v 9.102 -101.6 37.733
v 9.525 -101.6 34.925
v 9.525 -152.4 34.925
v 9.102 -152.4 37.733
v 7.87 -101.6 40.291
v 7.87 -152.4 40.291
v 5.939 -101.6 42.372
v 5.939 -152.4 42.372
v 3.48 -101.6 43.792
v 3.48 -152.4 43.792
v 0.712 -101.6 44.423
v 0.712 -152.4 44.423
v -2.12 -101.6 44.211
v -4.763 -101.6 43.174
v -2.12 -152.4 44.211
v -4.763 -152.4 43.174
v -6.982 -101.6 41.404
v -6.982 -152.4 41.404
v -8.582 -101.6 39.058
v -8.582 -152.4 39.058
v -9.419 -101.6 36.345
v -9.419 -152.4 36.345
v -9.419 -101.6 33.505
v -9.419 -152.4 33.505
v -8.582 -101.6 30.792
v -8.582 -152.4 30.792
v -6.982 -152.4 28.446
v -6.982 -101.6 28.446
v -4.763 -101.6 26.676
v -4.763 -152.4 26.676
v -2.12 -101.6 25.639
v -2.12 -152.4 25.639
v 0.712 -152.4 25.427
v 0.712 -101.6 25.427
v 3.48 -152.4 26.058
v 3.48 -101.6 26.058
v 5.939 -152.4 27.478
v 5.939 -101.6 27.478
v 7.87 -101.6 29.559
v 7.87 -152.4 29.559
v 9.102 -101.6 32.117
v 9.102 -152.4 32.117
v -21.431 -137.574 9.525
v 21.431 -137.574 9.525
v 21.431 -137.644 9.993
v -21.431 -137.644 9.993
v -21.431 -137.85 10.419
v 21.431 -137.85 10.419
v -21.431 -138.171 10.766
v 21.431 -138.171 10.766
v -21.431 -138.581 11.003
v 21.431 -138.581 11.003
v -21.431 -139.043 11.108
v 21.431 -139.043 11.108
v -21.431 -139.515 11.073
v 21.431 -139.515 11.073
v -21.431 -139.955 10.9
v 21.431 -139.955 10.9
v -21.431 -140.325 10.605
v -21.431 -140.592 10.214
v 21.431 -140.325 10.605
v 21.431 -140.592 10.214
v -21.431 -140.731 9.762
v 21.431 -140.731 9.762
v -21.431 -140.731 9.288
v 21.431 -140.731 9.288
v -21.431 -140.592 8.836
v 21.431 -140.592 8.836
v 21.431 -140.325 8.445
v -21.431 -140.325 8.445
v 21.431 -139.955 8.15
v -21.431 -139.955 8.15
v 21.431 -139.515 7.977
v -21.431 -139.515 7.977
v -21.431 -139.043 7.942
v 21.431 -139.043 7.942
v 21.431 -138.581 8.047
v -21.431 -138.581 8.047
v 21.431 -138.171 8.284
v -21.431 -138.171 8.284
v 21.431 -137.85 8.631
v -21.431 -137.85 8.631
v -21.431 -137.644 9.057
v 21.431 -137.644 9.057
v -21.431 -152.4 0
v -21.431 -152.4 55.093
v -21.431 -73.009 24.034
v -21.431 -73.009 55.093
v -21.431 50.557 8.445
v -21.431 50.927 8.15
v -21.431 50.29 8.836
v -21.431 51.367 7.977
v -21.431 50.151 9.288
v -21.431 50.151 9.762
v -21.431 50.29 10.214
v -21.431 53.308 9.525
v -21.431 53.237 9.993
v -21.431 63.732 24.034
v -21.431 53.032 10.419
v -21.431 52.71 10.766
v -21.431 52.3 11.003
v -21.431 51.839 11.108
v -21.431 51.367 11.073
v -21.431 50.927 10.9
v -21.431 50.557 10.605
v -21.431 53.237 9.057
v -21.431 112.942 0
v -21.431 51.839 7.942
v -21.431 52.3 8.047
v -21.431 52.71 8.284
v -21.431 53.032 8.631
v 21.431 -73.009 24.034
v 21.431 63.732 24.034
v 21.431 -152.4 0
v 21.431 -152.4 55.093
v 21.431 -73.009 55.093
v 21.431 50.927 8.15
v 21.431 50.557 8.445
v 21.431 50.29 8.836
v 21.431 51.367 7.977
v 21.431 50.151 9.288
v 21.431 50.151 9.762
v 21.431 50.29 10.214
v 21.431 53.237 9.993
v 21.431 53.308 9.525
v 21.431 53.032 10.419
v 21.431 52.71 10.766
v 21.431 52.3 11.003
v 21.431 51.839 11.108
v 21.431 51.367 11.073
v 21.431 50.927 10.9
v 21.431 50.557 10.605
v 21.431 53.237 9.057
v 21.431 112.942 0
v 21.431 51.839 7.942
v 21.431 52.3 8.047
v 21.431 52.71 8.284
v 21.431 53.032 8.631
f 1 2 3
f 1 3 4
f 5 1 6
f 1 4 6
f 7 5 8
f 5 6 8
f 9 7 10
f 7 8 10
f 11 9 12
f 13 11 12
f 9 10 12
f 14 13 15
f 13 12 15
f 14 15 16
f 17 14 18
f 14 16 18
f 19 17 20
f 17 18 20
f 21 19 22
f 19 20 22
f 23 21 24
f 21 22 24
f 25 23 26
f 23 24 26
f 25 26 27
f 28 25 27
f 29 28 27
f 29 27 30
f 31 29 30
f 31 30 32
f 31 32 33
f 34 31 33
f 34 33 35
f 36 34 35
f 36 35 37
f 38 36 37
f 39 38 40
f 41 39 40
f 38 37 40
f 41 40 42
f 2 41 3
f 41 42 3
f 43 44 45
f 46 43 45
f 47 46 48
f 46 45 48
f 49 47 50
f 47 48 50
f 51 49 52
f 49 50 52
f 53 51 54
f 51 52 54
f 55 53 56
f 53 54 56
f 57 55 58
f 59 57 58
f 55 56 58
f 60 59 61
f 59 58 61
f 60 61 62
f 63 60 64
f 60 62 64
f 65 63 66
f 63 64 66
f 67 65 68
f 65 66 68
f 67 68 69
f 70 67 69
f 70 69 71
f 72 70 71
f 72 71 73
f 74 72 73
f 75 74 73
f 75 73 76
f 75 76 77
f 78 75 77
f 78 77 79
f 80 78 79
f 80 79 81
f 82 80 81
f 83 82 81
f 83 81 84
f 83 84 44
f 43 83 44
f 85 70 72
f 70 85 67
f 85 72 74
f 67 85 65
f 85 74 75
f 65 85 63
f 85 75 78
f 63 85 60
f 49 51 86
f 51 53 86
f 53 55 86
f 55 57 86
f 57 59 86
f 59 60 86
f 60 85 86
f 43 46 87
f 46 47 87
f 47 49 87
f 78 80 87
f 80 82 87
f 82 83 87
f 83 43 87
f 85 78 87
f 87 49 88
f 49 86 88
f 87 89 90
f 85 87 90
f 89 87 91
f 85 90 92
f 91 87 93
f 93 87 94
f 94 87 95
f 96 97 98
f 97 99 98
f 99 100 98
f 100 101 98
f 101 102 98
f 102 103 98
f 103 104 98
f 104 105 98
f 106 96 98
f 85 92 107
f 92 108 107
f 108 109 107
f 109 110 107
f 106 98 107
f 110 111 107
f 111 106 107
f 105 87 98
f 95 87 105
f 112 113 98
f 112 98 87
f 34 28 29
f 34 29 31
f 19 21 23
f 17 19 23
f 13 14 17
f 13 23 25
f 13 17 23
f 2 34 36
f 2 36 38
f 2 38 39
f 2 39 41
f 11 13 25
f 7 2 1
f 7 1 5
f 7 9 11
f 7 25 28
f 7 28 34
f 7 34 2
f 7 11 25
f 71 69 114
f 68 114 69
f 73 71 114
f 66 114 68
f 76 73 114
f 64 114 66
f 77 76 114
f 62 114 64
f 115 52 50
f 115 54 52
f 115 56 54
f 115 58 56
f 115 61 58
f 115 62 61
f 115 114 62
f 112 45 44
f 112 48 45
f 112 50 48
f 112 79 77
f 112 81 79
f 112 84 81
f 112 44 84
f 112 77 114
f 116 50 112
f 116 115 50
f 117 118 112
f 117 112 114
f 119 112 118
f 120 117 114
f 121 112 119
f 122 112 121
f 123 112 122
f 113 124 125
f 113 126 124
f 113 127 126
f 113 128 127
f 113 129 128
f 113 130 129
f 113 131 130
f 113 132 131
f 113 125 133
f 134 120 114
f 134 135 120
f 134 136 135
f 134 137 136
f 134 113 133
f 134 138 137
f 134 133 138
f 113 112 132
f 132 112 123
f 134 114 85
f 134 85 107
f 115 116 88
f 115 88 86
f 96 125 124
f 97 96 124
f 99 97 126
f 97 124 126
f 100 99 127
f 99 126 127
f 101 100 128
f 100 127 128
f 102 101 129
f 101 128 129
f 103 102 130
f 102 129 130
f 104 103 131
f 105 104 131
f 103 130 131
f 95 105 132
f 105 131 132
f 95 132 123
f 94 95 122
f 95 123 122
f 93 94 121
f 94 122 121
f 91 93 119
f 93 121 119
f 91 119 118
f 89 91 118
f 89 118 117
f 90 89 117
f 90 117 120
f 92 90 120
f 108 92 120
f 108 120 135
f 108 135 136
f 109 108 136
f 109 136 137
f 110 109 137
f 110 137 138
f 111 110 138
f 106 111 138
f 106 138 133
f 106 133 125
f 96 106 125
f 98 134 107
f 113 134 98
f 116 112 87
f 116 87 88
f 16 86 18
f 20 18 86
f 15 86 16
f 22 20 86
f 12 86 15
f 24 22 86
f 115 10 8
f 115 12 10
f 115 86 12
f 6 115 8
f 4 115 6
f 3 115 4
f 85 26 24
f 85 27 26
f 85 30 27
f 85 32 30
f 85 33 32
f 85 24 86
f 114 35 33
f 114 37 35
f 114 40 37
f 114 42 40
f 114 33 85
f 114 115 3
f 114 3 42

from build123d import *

# Parameters (mm, degrees)
F1_DEPTH = 21.43125
F2_R     = 9.525
F3_DEPTH = 50.8
F4_R     = 1.5875
F5_DEPTH = 42.8635


with BuildPart() as f1:
    # F0 (on Right) → F1 (new body, symmetric)
    with BuildSketch(Plane.YZ):
        Polygon((-152.4, 69.85), (-152.4, 0), (152.4, 0), (152.4, 19.05), align=None)
    extrude(amount=F1_DEPTH, both=True)

    # F2 (on face) → F3 (cut)
    with BuildSketch(Plane.XZ.offset(152.4)):
        with Locations((0, 34.925)):
            Circle(F2_R)
    extrude(amount=-F3_DEPTH, mode=Mode.SUBTRACT)

    # F4 (on face) → F5 (intersect, through all)
    with BuildSketch(Plane.YZ.offset(21.43125)):
        Polygon((-73.0092376471, 55.0932995975), (-152.4, 55.0932995975), (-152.4, 0), (112.9424795508, 0), (63.7318268418, 24.0341164172), (-73.0092376471, 24.0341164172), (-73.0092376471, 37.3451933265), align=None)
        with Locations((-139.1612589359, 9.525)):
            Circle(F4_R, mode=Mode.SUBTRACT)
        with Locations((51.7203733325, 9.525)):
            Circle(F4_R, mode=Mode.SUBTRACT)
    extrude(amount=-F5_DEPTH, mode=Mode.INTERSECT)


solid = f1.part
